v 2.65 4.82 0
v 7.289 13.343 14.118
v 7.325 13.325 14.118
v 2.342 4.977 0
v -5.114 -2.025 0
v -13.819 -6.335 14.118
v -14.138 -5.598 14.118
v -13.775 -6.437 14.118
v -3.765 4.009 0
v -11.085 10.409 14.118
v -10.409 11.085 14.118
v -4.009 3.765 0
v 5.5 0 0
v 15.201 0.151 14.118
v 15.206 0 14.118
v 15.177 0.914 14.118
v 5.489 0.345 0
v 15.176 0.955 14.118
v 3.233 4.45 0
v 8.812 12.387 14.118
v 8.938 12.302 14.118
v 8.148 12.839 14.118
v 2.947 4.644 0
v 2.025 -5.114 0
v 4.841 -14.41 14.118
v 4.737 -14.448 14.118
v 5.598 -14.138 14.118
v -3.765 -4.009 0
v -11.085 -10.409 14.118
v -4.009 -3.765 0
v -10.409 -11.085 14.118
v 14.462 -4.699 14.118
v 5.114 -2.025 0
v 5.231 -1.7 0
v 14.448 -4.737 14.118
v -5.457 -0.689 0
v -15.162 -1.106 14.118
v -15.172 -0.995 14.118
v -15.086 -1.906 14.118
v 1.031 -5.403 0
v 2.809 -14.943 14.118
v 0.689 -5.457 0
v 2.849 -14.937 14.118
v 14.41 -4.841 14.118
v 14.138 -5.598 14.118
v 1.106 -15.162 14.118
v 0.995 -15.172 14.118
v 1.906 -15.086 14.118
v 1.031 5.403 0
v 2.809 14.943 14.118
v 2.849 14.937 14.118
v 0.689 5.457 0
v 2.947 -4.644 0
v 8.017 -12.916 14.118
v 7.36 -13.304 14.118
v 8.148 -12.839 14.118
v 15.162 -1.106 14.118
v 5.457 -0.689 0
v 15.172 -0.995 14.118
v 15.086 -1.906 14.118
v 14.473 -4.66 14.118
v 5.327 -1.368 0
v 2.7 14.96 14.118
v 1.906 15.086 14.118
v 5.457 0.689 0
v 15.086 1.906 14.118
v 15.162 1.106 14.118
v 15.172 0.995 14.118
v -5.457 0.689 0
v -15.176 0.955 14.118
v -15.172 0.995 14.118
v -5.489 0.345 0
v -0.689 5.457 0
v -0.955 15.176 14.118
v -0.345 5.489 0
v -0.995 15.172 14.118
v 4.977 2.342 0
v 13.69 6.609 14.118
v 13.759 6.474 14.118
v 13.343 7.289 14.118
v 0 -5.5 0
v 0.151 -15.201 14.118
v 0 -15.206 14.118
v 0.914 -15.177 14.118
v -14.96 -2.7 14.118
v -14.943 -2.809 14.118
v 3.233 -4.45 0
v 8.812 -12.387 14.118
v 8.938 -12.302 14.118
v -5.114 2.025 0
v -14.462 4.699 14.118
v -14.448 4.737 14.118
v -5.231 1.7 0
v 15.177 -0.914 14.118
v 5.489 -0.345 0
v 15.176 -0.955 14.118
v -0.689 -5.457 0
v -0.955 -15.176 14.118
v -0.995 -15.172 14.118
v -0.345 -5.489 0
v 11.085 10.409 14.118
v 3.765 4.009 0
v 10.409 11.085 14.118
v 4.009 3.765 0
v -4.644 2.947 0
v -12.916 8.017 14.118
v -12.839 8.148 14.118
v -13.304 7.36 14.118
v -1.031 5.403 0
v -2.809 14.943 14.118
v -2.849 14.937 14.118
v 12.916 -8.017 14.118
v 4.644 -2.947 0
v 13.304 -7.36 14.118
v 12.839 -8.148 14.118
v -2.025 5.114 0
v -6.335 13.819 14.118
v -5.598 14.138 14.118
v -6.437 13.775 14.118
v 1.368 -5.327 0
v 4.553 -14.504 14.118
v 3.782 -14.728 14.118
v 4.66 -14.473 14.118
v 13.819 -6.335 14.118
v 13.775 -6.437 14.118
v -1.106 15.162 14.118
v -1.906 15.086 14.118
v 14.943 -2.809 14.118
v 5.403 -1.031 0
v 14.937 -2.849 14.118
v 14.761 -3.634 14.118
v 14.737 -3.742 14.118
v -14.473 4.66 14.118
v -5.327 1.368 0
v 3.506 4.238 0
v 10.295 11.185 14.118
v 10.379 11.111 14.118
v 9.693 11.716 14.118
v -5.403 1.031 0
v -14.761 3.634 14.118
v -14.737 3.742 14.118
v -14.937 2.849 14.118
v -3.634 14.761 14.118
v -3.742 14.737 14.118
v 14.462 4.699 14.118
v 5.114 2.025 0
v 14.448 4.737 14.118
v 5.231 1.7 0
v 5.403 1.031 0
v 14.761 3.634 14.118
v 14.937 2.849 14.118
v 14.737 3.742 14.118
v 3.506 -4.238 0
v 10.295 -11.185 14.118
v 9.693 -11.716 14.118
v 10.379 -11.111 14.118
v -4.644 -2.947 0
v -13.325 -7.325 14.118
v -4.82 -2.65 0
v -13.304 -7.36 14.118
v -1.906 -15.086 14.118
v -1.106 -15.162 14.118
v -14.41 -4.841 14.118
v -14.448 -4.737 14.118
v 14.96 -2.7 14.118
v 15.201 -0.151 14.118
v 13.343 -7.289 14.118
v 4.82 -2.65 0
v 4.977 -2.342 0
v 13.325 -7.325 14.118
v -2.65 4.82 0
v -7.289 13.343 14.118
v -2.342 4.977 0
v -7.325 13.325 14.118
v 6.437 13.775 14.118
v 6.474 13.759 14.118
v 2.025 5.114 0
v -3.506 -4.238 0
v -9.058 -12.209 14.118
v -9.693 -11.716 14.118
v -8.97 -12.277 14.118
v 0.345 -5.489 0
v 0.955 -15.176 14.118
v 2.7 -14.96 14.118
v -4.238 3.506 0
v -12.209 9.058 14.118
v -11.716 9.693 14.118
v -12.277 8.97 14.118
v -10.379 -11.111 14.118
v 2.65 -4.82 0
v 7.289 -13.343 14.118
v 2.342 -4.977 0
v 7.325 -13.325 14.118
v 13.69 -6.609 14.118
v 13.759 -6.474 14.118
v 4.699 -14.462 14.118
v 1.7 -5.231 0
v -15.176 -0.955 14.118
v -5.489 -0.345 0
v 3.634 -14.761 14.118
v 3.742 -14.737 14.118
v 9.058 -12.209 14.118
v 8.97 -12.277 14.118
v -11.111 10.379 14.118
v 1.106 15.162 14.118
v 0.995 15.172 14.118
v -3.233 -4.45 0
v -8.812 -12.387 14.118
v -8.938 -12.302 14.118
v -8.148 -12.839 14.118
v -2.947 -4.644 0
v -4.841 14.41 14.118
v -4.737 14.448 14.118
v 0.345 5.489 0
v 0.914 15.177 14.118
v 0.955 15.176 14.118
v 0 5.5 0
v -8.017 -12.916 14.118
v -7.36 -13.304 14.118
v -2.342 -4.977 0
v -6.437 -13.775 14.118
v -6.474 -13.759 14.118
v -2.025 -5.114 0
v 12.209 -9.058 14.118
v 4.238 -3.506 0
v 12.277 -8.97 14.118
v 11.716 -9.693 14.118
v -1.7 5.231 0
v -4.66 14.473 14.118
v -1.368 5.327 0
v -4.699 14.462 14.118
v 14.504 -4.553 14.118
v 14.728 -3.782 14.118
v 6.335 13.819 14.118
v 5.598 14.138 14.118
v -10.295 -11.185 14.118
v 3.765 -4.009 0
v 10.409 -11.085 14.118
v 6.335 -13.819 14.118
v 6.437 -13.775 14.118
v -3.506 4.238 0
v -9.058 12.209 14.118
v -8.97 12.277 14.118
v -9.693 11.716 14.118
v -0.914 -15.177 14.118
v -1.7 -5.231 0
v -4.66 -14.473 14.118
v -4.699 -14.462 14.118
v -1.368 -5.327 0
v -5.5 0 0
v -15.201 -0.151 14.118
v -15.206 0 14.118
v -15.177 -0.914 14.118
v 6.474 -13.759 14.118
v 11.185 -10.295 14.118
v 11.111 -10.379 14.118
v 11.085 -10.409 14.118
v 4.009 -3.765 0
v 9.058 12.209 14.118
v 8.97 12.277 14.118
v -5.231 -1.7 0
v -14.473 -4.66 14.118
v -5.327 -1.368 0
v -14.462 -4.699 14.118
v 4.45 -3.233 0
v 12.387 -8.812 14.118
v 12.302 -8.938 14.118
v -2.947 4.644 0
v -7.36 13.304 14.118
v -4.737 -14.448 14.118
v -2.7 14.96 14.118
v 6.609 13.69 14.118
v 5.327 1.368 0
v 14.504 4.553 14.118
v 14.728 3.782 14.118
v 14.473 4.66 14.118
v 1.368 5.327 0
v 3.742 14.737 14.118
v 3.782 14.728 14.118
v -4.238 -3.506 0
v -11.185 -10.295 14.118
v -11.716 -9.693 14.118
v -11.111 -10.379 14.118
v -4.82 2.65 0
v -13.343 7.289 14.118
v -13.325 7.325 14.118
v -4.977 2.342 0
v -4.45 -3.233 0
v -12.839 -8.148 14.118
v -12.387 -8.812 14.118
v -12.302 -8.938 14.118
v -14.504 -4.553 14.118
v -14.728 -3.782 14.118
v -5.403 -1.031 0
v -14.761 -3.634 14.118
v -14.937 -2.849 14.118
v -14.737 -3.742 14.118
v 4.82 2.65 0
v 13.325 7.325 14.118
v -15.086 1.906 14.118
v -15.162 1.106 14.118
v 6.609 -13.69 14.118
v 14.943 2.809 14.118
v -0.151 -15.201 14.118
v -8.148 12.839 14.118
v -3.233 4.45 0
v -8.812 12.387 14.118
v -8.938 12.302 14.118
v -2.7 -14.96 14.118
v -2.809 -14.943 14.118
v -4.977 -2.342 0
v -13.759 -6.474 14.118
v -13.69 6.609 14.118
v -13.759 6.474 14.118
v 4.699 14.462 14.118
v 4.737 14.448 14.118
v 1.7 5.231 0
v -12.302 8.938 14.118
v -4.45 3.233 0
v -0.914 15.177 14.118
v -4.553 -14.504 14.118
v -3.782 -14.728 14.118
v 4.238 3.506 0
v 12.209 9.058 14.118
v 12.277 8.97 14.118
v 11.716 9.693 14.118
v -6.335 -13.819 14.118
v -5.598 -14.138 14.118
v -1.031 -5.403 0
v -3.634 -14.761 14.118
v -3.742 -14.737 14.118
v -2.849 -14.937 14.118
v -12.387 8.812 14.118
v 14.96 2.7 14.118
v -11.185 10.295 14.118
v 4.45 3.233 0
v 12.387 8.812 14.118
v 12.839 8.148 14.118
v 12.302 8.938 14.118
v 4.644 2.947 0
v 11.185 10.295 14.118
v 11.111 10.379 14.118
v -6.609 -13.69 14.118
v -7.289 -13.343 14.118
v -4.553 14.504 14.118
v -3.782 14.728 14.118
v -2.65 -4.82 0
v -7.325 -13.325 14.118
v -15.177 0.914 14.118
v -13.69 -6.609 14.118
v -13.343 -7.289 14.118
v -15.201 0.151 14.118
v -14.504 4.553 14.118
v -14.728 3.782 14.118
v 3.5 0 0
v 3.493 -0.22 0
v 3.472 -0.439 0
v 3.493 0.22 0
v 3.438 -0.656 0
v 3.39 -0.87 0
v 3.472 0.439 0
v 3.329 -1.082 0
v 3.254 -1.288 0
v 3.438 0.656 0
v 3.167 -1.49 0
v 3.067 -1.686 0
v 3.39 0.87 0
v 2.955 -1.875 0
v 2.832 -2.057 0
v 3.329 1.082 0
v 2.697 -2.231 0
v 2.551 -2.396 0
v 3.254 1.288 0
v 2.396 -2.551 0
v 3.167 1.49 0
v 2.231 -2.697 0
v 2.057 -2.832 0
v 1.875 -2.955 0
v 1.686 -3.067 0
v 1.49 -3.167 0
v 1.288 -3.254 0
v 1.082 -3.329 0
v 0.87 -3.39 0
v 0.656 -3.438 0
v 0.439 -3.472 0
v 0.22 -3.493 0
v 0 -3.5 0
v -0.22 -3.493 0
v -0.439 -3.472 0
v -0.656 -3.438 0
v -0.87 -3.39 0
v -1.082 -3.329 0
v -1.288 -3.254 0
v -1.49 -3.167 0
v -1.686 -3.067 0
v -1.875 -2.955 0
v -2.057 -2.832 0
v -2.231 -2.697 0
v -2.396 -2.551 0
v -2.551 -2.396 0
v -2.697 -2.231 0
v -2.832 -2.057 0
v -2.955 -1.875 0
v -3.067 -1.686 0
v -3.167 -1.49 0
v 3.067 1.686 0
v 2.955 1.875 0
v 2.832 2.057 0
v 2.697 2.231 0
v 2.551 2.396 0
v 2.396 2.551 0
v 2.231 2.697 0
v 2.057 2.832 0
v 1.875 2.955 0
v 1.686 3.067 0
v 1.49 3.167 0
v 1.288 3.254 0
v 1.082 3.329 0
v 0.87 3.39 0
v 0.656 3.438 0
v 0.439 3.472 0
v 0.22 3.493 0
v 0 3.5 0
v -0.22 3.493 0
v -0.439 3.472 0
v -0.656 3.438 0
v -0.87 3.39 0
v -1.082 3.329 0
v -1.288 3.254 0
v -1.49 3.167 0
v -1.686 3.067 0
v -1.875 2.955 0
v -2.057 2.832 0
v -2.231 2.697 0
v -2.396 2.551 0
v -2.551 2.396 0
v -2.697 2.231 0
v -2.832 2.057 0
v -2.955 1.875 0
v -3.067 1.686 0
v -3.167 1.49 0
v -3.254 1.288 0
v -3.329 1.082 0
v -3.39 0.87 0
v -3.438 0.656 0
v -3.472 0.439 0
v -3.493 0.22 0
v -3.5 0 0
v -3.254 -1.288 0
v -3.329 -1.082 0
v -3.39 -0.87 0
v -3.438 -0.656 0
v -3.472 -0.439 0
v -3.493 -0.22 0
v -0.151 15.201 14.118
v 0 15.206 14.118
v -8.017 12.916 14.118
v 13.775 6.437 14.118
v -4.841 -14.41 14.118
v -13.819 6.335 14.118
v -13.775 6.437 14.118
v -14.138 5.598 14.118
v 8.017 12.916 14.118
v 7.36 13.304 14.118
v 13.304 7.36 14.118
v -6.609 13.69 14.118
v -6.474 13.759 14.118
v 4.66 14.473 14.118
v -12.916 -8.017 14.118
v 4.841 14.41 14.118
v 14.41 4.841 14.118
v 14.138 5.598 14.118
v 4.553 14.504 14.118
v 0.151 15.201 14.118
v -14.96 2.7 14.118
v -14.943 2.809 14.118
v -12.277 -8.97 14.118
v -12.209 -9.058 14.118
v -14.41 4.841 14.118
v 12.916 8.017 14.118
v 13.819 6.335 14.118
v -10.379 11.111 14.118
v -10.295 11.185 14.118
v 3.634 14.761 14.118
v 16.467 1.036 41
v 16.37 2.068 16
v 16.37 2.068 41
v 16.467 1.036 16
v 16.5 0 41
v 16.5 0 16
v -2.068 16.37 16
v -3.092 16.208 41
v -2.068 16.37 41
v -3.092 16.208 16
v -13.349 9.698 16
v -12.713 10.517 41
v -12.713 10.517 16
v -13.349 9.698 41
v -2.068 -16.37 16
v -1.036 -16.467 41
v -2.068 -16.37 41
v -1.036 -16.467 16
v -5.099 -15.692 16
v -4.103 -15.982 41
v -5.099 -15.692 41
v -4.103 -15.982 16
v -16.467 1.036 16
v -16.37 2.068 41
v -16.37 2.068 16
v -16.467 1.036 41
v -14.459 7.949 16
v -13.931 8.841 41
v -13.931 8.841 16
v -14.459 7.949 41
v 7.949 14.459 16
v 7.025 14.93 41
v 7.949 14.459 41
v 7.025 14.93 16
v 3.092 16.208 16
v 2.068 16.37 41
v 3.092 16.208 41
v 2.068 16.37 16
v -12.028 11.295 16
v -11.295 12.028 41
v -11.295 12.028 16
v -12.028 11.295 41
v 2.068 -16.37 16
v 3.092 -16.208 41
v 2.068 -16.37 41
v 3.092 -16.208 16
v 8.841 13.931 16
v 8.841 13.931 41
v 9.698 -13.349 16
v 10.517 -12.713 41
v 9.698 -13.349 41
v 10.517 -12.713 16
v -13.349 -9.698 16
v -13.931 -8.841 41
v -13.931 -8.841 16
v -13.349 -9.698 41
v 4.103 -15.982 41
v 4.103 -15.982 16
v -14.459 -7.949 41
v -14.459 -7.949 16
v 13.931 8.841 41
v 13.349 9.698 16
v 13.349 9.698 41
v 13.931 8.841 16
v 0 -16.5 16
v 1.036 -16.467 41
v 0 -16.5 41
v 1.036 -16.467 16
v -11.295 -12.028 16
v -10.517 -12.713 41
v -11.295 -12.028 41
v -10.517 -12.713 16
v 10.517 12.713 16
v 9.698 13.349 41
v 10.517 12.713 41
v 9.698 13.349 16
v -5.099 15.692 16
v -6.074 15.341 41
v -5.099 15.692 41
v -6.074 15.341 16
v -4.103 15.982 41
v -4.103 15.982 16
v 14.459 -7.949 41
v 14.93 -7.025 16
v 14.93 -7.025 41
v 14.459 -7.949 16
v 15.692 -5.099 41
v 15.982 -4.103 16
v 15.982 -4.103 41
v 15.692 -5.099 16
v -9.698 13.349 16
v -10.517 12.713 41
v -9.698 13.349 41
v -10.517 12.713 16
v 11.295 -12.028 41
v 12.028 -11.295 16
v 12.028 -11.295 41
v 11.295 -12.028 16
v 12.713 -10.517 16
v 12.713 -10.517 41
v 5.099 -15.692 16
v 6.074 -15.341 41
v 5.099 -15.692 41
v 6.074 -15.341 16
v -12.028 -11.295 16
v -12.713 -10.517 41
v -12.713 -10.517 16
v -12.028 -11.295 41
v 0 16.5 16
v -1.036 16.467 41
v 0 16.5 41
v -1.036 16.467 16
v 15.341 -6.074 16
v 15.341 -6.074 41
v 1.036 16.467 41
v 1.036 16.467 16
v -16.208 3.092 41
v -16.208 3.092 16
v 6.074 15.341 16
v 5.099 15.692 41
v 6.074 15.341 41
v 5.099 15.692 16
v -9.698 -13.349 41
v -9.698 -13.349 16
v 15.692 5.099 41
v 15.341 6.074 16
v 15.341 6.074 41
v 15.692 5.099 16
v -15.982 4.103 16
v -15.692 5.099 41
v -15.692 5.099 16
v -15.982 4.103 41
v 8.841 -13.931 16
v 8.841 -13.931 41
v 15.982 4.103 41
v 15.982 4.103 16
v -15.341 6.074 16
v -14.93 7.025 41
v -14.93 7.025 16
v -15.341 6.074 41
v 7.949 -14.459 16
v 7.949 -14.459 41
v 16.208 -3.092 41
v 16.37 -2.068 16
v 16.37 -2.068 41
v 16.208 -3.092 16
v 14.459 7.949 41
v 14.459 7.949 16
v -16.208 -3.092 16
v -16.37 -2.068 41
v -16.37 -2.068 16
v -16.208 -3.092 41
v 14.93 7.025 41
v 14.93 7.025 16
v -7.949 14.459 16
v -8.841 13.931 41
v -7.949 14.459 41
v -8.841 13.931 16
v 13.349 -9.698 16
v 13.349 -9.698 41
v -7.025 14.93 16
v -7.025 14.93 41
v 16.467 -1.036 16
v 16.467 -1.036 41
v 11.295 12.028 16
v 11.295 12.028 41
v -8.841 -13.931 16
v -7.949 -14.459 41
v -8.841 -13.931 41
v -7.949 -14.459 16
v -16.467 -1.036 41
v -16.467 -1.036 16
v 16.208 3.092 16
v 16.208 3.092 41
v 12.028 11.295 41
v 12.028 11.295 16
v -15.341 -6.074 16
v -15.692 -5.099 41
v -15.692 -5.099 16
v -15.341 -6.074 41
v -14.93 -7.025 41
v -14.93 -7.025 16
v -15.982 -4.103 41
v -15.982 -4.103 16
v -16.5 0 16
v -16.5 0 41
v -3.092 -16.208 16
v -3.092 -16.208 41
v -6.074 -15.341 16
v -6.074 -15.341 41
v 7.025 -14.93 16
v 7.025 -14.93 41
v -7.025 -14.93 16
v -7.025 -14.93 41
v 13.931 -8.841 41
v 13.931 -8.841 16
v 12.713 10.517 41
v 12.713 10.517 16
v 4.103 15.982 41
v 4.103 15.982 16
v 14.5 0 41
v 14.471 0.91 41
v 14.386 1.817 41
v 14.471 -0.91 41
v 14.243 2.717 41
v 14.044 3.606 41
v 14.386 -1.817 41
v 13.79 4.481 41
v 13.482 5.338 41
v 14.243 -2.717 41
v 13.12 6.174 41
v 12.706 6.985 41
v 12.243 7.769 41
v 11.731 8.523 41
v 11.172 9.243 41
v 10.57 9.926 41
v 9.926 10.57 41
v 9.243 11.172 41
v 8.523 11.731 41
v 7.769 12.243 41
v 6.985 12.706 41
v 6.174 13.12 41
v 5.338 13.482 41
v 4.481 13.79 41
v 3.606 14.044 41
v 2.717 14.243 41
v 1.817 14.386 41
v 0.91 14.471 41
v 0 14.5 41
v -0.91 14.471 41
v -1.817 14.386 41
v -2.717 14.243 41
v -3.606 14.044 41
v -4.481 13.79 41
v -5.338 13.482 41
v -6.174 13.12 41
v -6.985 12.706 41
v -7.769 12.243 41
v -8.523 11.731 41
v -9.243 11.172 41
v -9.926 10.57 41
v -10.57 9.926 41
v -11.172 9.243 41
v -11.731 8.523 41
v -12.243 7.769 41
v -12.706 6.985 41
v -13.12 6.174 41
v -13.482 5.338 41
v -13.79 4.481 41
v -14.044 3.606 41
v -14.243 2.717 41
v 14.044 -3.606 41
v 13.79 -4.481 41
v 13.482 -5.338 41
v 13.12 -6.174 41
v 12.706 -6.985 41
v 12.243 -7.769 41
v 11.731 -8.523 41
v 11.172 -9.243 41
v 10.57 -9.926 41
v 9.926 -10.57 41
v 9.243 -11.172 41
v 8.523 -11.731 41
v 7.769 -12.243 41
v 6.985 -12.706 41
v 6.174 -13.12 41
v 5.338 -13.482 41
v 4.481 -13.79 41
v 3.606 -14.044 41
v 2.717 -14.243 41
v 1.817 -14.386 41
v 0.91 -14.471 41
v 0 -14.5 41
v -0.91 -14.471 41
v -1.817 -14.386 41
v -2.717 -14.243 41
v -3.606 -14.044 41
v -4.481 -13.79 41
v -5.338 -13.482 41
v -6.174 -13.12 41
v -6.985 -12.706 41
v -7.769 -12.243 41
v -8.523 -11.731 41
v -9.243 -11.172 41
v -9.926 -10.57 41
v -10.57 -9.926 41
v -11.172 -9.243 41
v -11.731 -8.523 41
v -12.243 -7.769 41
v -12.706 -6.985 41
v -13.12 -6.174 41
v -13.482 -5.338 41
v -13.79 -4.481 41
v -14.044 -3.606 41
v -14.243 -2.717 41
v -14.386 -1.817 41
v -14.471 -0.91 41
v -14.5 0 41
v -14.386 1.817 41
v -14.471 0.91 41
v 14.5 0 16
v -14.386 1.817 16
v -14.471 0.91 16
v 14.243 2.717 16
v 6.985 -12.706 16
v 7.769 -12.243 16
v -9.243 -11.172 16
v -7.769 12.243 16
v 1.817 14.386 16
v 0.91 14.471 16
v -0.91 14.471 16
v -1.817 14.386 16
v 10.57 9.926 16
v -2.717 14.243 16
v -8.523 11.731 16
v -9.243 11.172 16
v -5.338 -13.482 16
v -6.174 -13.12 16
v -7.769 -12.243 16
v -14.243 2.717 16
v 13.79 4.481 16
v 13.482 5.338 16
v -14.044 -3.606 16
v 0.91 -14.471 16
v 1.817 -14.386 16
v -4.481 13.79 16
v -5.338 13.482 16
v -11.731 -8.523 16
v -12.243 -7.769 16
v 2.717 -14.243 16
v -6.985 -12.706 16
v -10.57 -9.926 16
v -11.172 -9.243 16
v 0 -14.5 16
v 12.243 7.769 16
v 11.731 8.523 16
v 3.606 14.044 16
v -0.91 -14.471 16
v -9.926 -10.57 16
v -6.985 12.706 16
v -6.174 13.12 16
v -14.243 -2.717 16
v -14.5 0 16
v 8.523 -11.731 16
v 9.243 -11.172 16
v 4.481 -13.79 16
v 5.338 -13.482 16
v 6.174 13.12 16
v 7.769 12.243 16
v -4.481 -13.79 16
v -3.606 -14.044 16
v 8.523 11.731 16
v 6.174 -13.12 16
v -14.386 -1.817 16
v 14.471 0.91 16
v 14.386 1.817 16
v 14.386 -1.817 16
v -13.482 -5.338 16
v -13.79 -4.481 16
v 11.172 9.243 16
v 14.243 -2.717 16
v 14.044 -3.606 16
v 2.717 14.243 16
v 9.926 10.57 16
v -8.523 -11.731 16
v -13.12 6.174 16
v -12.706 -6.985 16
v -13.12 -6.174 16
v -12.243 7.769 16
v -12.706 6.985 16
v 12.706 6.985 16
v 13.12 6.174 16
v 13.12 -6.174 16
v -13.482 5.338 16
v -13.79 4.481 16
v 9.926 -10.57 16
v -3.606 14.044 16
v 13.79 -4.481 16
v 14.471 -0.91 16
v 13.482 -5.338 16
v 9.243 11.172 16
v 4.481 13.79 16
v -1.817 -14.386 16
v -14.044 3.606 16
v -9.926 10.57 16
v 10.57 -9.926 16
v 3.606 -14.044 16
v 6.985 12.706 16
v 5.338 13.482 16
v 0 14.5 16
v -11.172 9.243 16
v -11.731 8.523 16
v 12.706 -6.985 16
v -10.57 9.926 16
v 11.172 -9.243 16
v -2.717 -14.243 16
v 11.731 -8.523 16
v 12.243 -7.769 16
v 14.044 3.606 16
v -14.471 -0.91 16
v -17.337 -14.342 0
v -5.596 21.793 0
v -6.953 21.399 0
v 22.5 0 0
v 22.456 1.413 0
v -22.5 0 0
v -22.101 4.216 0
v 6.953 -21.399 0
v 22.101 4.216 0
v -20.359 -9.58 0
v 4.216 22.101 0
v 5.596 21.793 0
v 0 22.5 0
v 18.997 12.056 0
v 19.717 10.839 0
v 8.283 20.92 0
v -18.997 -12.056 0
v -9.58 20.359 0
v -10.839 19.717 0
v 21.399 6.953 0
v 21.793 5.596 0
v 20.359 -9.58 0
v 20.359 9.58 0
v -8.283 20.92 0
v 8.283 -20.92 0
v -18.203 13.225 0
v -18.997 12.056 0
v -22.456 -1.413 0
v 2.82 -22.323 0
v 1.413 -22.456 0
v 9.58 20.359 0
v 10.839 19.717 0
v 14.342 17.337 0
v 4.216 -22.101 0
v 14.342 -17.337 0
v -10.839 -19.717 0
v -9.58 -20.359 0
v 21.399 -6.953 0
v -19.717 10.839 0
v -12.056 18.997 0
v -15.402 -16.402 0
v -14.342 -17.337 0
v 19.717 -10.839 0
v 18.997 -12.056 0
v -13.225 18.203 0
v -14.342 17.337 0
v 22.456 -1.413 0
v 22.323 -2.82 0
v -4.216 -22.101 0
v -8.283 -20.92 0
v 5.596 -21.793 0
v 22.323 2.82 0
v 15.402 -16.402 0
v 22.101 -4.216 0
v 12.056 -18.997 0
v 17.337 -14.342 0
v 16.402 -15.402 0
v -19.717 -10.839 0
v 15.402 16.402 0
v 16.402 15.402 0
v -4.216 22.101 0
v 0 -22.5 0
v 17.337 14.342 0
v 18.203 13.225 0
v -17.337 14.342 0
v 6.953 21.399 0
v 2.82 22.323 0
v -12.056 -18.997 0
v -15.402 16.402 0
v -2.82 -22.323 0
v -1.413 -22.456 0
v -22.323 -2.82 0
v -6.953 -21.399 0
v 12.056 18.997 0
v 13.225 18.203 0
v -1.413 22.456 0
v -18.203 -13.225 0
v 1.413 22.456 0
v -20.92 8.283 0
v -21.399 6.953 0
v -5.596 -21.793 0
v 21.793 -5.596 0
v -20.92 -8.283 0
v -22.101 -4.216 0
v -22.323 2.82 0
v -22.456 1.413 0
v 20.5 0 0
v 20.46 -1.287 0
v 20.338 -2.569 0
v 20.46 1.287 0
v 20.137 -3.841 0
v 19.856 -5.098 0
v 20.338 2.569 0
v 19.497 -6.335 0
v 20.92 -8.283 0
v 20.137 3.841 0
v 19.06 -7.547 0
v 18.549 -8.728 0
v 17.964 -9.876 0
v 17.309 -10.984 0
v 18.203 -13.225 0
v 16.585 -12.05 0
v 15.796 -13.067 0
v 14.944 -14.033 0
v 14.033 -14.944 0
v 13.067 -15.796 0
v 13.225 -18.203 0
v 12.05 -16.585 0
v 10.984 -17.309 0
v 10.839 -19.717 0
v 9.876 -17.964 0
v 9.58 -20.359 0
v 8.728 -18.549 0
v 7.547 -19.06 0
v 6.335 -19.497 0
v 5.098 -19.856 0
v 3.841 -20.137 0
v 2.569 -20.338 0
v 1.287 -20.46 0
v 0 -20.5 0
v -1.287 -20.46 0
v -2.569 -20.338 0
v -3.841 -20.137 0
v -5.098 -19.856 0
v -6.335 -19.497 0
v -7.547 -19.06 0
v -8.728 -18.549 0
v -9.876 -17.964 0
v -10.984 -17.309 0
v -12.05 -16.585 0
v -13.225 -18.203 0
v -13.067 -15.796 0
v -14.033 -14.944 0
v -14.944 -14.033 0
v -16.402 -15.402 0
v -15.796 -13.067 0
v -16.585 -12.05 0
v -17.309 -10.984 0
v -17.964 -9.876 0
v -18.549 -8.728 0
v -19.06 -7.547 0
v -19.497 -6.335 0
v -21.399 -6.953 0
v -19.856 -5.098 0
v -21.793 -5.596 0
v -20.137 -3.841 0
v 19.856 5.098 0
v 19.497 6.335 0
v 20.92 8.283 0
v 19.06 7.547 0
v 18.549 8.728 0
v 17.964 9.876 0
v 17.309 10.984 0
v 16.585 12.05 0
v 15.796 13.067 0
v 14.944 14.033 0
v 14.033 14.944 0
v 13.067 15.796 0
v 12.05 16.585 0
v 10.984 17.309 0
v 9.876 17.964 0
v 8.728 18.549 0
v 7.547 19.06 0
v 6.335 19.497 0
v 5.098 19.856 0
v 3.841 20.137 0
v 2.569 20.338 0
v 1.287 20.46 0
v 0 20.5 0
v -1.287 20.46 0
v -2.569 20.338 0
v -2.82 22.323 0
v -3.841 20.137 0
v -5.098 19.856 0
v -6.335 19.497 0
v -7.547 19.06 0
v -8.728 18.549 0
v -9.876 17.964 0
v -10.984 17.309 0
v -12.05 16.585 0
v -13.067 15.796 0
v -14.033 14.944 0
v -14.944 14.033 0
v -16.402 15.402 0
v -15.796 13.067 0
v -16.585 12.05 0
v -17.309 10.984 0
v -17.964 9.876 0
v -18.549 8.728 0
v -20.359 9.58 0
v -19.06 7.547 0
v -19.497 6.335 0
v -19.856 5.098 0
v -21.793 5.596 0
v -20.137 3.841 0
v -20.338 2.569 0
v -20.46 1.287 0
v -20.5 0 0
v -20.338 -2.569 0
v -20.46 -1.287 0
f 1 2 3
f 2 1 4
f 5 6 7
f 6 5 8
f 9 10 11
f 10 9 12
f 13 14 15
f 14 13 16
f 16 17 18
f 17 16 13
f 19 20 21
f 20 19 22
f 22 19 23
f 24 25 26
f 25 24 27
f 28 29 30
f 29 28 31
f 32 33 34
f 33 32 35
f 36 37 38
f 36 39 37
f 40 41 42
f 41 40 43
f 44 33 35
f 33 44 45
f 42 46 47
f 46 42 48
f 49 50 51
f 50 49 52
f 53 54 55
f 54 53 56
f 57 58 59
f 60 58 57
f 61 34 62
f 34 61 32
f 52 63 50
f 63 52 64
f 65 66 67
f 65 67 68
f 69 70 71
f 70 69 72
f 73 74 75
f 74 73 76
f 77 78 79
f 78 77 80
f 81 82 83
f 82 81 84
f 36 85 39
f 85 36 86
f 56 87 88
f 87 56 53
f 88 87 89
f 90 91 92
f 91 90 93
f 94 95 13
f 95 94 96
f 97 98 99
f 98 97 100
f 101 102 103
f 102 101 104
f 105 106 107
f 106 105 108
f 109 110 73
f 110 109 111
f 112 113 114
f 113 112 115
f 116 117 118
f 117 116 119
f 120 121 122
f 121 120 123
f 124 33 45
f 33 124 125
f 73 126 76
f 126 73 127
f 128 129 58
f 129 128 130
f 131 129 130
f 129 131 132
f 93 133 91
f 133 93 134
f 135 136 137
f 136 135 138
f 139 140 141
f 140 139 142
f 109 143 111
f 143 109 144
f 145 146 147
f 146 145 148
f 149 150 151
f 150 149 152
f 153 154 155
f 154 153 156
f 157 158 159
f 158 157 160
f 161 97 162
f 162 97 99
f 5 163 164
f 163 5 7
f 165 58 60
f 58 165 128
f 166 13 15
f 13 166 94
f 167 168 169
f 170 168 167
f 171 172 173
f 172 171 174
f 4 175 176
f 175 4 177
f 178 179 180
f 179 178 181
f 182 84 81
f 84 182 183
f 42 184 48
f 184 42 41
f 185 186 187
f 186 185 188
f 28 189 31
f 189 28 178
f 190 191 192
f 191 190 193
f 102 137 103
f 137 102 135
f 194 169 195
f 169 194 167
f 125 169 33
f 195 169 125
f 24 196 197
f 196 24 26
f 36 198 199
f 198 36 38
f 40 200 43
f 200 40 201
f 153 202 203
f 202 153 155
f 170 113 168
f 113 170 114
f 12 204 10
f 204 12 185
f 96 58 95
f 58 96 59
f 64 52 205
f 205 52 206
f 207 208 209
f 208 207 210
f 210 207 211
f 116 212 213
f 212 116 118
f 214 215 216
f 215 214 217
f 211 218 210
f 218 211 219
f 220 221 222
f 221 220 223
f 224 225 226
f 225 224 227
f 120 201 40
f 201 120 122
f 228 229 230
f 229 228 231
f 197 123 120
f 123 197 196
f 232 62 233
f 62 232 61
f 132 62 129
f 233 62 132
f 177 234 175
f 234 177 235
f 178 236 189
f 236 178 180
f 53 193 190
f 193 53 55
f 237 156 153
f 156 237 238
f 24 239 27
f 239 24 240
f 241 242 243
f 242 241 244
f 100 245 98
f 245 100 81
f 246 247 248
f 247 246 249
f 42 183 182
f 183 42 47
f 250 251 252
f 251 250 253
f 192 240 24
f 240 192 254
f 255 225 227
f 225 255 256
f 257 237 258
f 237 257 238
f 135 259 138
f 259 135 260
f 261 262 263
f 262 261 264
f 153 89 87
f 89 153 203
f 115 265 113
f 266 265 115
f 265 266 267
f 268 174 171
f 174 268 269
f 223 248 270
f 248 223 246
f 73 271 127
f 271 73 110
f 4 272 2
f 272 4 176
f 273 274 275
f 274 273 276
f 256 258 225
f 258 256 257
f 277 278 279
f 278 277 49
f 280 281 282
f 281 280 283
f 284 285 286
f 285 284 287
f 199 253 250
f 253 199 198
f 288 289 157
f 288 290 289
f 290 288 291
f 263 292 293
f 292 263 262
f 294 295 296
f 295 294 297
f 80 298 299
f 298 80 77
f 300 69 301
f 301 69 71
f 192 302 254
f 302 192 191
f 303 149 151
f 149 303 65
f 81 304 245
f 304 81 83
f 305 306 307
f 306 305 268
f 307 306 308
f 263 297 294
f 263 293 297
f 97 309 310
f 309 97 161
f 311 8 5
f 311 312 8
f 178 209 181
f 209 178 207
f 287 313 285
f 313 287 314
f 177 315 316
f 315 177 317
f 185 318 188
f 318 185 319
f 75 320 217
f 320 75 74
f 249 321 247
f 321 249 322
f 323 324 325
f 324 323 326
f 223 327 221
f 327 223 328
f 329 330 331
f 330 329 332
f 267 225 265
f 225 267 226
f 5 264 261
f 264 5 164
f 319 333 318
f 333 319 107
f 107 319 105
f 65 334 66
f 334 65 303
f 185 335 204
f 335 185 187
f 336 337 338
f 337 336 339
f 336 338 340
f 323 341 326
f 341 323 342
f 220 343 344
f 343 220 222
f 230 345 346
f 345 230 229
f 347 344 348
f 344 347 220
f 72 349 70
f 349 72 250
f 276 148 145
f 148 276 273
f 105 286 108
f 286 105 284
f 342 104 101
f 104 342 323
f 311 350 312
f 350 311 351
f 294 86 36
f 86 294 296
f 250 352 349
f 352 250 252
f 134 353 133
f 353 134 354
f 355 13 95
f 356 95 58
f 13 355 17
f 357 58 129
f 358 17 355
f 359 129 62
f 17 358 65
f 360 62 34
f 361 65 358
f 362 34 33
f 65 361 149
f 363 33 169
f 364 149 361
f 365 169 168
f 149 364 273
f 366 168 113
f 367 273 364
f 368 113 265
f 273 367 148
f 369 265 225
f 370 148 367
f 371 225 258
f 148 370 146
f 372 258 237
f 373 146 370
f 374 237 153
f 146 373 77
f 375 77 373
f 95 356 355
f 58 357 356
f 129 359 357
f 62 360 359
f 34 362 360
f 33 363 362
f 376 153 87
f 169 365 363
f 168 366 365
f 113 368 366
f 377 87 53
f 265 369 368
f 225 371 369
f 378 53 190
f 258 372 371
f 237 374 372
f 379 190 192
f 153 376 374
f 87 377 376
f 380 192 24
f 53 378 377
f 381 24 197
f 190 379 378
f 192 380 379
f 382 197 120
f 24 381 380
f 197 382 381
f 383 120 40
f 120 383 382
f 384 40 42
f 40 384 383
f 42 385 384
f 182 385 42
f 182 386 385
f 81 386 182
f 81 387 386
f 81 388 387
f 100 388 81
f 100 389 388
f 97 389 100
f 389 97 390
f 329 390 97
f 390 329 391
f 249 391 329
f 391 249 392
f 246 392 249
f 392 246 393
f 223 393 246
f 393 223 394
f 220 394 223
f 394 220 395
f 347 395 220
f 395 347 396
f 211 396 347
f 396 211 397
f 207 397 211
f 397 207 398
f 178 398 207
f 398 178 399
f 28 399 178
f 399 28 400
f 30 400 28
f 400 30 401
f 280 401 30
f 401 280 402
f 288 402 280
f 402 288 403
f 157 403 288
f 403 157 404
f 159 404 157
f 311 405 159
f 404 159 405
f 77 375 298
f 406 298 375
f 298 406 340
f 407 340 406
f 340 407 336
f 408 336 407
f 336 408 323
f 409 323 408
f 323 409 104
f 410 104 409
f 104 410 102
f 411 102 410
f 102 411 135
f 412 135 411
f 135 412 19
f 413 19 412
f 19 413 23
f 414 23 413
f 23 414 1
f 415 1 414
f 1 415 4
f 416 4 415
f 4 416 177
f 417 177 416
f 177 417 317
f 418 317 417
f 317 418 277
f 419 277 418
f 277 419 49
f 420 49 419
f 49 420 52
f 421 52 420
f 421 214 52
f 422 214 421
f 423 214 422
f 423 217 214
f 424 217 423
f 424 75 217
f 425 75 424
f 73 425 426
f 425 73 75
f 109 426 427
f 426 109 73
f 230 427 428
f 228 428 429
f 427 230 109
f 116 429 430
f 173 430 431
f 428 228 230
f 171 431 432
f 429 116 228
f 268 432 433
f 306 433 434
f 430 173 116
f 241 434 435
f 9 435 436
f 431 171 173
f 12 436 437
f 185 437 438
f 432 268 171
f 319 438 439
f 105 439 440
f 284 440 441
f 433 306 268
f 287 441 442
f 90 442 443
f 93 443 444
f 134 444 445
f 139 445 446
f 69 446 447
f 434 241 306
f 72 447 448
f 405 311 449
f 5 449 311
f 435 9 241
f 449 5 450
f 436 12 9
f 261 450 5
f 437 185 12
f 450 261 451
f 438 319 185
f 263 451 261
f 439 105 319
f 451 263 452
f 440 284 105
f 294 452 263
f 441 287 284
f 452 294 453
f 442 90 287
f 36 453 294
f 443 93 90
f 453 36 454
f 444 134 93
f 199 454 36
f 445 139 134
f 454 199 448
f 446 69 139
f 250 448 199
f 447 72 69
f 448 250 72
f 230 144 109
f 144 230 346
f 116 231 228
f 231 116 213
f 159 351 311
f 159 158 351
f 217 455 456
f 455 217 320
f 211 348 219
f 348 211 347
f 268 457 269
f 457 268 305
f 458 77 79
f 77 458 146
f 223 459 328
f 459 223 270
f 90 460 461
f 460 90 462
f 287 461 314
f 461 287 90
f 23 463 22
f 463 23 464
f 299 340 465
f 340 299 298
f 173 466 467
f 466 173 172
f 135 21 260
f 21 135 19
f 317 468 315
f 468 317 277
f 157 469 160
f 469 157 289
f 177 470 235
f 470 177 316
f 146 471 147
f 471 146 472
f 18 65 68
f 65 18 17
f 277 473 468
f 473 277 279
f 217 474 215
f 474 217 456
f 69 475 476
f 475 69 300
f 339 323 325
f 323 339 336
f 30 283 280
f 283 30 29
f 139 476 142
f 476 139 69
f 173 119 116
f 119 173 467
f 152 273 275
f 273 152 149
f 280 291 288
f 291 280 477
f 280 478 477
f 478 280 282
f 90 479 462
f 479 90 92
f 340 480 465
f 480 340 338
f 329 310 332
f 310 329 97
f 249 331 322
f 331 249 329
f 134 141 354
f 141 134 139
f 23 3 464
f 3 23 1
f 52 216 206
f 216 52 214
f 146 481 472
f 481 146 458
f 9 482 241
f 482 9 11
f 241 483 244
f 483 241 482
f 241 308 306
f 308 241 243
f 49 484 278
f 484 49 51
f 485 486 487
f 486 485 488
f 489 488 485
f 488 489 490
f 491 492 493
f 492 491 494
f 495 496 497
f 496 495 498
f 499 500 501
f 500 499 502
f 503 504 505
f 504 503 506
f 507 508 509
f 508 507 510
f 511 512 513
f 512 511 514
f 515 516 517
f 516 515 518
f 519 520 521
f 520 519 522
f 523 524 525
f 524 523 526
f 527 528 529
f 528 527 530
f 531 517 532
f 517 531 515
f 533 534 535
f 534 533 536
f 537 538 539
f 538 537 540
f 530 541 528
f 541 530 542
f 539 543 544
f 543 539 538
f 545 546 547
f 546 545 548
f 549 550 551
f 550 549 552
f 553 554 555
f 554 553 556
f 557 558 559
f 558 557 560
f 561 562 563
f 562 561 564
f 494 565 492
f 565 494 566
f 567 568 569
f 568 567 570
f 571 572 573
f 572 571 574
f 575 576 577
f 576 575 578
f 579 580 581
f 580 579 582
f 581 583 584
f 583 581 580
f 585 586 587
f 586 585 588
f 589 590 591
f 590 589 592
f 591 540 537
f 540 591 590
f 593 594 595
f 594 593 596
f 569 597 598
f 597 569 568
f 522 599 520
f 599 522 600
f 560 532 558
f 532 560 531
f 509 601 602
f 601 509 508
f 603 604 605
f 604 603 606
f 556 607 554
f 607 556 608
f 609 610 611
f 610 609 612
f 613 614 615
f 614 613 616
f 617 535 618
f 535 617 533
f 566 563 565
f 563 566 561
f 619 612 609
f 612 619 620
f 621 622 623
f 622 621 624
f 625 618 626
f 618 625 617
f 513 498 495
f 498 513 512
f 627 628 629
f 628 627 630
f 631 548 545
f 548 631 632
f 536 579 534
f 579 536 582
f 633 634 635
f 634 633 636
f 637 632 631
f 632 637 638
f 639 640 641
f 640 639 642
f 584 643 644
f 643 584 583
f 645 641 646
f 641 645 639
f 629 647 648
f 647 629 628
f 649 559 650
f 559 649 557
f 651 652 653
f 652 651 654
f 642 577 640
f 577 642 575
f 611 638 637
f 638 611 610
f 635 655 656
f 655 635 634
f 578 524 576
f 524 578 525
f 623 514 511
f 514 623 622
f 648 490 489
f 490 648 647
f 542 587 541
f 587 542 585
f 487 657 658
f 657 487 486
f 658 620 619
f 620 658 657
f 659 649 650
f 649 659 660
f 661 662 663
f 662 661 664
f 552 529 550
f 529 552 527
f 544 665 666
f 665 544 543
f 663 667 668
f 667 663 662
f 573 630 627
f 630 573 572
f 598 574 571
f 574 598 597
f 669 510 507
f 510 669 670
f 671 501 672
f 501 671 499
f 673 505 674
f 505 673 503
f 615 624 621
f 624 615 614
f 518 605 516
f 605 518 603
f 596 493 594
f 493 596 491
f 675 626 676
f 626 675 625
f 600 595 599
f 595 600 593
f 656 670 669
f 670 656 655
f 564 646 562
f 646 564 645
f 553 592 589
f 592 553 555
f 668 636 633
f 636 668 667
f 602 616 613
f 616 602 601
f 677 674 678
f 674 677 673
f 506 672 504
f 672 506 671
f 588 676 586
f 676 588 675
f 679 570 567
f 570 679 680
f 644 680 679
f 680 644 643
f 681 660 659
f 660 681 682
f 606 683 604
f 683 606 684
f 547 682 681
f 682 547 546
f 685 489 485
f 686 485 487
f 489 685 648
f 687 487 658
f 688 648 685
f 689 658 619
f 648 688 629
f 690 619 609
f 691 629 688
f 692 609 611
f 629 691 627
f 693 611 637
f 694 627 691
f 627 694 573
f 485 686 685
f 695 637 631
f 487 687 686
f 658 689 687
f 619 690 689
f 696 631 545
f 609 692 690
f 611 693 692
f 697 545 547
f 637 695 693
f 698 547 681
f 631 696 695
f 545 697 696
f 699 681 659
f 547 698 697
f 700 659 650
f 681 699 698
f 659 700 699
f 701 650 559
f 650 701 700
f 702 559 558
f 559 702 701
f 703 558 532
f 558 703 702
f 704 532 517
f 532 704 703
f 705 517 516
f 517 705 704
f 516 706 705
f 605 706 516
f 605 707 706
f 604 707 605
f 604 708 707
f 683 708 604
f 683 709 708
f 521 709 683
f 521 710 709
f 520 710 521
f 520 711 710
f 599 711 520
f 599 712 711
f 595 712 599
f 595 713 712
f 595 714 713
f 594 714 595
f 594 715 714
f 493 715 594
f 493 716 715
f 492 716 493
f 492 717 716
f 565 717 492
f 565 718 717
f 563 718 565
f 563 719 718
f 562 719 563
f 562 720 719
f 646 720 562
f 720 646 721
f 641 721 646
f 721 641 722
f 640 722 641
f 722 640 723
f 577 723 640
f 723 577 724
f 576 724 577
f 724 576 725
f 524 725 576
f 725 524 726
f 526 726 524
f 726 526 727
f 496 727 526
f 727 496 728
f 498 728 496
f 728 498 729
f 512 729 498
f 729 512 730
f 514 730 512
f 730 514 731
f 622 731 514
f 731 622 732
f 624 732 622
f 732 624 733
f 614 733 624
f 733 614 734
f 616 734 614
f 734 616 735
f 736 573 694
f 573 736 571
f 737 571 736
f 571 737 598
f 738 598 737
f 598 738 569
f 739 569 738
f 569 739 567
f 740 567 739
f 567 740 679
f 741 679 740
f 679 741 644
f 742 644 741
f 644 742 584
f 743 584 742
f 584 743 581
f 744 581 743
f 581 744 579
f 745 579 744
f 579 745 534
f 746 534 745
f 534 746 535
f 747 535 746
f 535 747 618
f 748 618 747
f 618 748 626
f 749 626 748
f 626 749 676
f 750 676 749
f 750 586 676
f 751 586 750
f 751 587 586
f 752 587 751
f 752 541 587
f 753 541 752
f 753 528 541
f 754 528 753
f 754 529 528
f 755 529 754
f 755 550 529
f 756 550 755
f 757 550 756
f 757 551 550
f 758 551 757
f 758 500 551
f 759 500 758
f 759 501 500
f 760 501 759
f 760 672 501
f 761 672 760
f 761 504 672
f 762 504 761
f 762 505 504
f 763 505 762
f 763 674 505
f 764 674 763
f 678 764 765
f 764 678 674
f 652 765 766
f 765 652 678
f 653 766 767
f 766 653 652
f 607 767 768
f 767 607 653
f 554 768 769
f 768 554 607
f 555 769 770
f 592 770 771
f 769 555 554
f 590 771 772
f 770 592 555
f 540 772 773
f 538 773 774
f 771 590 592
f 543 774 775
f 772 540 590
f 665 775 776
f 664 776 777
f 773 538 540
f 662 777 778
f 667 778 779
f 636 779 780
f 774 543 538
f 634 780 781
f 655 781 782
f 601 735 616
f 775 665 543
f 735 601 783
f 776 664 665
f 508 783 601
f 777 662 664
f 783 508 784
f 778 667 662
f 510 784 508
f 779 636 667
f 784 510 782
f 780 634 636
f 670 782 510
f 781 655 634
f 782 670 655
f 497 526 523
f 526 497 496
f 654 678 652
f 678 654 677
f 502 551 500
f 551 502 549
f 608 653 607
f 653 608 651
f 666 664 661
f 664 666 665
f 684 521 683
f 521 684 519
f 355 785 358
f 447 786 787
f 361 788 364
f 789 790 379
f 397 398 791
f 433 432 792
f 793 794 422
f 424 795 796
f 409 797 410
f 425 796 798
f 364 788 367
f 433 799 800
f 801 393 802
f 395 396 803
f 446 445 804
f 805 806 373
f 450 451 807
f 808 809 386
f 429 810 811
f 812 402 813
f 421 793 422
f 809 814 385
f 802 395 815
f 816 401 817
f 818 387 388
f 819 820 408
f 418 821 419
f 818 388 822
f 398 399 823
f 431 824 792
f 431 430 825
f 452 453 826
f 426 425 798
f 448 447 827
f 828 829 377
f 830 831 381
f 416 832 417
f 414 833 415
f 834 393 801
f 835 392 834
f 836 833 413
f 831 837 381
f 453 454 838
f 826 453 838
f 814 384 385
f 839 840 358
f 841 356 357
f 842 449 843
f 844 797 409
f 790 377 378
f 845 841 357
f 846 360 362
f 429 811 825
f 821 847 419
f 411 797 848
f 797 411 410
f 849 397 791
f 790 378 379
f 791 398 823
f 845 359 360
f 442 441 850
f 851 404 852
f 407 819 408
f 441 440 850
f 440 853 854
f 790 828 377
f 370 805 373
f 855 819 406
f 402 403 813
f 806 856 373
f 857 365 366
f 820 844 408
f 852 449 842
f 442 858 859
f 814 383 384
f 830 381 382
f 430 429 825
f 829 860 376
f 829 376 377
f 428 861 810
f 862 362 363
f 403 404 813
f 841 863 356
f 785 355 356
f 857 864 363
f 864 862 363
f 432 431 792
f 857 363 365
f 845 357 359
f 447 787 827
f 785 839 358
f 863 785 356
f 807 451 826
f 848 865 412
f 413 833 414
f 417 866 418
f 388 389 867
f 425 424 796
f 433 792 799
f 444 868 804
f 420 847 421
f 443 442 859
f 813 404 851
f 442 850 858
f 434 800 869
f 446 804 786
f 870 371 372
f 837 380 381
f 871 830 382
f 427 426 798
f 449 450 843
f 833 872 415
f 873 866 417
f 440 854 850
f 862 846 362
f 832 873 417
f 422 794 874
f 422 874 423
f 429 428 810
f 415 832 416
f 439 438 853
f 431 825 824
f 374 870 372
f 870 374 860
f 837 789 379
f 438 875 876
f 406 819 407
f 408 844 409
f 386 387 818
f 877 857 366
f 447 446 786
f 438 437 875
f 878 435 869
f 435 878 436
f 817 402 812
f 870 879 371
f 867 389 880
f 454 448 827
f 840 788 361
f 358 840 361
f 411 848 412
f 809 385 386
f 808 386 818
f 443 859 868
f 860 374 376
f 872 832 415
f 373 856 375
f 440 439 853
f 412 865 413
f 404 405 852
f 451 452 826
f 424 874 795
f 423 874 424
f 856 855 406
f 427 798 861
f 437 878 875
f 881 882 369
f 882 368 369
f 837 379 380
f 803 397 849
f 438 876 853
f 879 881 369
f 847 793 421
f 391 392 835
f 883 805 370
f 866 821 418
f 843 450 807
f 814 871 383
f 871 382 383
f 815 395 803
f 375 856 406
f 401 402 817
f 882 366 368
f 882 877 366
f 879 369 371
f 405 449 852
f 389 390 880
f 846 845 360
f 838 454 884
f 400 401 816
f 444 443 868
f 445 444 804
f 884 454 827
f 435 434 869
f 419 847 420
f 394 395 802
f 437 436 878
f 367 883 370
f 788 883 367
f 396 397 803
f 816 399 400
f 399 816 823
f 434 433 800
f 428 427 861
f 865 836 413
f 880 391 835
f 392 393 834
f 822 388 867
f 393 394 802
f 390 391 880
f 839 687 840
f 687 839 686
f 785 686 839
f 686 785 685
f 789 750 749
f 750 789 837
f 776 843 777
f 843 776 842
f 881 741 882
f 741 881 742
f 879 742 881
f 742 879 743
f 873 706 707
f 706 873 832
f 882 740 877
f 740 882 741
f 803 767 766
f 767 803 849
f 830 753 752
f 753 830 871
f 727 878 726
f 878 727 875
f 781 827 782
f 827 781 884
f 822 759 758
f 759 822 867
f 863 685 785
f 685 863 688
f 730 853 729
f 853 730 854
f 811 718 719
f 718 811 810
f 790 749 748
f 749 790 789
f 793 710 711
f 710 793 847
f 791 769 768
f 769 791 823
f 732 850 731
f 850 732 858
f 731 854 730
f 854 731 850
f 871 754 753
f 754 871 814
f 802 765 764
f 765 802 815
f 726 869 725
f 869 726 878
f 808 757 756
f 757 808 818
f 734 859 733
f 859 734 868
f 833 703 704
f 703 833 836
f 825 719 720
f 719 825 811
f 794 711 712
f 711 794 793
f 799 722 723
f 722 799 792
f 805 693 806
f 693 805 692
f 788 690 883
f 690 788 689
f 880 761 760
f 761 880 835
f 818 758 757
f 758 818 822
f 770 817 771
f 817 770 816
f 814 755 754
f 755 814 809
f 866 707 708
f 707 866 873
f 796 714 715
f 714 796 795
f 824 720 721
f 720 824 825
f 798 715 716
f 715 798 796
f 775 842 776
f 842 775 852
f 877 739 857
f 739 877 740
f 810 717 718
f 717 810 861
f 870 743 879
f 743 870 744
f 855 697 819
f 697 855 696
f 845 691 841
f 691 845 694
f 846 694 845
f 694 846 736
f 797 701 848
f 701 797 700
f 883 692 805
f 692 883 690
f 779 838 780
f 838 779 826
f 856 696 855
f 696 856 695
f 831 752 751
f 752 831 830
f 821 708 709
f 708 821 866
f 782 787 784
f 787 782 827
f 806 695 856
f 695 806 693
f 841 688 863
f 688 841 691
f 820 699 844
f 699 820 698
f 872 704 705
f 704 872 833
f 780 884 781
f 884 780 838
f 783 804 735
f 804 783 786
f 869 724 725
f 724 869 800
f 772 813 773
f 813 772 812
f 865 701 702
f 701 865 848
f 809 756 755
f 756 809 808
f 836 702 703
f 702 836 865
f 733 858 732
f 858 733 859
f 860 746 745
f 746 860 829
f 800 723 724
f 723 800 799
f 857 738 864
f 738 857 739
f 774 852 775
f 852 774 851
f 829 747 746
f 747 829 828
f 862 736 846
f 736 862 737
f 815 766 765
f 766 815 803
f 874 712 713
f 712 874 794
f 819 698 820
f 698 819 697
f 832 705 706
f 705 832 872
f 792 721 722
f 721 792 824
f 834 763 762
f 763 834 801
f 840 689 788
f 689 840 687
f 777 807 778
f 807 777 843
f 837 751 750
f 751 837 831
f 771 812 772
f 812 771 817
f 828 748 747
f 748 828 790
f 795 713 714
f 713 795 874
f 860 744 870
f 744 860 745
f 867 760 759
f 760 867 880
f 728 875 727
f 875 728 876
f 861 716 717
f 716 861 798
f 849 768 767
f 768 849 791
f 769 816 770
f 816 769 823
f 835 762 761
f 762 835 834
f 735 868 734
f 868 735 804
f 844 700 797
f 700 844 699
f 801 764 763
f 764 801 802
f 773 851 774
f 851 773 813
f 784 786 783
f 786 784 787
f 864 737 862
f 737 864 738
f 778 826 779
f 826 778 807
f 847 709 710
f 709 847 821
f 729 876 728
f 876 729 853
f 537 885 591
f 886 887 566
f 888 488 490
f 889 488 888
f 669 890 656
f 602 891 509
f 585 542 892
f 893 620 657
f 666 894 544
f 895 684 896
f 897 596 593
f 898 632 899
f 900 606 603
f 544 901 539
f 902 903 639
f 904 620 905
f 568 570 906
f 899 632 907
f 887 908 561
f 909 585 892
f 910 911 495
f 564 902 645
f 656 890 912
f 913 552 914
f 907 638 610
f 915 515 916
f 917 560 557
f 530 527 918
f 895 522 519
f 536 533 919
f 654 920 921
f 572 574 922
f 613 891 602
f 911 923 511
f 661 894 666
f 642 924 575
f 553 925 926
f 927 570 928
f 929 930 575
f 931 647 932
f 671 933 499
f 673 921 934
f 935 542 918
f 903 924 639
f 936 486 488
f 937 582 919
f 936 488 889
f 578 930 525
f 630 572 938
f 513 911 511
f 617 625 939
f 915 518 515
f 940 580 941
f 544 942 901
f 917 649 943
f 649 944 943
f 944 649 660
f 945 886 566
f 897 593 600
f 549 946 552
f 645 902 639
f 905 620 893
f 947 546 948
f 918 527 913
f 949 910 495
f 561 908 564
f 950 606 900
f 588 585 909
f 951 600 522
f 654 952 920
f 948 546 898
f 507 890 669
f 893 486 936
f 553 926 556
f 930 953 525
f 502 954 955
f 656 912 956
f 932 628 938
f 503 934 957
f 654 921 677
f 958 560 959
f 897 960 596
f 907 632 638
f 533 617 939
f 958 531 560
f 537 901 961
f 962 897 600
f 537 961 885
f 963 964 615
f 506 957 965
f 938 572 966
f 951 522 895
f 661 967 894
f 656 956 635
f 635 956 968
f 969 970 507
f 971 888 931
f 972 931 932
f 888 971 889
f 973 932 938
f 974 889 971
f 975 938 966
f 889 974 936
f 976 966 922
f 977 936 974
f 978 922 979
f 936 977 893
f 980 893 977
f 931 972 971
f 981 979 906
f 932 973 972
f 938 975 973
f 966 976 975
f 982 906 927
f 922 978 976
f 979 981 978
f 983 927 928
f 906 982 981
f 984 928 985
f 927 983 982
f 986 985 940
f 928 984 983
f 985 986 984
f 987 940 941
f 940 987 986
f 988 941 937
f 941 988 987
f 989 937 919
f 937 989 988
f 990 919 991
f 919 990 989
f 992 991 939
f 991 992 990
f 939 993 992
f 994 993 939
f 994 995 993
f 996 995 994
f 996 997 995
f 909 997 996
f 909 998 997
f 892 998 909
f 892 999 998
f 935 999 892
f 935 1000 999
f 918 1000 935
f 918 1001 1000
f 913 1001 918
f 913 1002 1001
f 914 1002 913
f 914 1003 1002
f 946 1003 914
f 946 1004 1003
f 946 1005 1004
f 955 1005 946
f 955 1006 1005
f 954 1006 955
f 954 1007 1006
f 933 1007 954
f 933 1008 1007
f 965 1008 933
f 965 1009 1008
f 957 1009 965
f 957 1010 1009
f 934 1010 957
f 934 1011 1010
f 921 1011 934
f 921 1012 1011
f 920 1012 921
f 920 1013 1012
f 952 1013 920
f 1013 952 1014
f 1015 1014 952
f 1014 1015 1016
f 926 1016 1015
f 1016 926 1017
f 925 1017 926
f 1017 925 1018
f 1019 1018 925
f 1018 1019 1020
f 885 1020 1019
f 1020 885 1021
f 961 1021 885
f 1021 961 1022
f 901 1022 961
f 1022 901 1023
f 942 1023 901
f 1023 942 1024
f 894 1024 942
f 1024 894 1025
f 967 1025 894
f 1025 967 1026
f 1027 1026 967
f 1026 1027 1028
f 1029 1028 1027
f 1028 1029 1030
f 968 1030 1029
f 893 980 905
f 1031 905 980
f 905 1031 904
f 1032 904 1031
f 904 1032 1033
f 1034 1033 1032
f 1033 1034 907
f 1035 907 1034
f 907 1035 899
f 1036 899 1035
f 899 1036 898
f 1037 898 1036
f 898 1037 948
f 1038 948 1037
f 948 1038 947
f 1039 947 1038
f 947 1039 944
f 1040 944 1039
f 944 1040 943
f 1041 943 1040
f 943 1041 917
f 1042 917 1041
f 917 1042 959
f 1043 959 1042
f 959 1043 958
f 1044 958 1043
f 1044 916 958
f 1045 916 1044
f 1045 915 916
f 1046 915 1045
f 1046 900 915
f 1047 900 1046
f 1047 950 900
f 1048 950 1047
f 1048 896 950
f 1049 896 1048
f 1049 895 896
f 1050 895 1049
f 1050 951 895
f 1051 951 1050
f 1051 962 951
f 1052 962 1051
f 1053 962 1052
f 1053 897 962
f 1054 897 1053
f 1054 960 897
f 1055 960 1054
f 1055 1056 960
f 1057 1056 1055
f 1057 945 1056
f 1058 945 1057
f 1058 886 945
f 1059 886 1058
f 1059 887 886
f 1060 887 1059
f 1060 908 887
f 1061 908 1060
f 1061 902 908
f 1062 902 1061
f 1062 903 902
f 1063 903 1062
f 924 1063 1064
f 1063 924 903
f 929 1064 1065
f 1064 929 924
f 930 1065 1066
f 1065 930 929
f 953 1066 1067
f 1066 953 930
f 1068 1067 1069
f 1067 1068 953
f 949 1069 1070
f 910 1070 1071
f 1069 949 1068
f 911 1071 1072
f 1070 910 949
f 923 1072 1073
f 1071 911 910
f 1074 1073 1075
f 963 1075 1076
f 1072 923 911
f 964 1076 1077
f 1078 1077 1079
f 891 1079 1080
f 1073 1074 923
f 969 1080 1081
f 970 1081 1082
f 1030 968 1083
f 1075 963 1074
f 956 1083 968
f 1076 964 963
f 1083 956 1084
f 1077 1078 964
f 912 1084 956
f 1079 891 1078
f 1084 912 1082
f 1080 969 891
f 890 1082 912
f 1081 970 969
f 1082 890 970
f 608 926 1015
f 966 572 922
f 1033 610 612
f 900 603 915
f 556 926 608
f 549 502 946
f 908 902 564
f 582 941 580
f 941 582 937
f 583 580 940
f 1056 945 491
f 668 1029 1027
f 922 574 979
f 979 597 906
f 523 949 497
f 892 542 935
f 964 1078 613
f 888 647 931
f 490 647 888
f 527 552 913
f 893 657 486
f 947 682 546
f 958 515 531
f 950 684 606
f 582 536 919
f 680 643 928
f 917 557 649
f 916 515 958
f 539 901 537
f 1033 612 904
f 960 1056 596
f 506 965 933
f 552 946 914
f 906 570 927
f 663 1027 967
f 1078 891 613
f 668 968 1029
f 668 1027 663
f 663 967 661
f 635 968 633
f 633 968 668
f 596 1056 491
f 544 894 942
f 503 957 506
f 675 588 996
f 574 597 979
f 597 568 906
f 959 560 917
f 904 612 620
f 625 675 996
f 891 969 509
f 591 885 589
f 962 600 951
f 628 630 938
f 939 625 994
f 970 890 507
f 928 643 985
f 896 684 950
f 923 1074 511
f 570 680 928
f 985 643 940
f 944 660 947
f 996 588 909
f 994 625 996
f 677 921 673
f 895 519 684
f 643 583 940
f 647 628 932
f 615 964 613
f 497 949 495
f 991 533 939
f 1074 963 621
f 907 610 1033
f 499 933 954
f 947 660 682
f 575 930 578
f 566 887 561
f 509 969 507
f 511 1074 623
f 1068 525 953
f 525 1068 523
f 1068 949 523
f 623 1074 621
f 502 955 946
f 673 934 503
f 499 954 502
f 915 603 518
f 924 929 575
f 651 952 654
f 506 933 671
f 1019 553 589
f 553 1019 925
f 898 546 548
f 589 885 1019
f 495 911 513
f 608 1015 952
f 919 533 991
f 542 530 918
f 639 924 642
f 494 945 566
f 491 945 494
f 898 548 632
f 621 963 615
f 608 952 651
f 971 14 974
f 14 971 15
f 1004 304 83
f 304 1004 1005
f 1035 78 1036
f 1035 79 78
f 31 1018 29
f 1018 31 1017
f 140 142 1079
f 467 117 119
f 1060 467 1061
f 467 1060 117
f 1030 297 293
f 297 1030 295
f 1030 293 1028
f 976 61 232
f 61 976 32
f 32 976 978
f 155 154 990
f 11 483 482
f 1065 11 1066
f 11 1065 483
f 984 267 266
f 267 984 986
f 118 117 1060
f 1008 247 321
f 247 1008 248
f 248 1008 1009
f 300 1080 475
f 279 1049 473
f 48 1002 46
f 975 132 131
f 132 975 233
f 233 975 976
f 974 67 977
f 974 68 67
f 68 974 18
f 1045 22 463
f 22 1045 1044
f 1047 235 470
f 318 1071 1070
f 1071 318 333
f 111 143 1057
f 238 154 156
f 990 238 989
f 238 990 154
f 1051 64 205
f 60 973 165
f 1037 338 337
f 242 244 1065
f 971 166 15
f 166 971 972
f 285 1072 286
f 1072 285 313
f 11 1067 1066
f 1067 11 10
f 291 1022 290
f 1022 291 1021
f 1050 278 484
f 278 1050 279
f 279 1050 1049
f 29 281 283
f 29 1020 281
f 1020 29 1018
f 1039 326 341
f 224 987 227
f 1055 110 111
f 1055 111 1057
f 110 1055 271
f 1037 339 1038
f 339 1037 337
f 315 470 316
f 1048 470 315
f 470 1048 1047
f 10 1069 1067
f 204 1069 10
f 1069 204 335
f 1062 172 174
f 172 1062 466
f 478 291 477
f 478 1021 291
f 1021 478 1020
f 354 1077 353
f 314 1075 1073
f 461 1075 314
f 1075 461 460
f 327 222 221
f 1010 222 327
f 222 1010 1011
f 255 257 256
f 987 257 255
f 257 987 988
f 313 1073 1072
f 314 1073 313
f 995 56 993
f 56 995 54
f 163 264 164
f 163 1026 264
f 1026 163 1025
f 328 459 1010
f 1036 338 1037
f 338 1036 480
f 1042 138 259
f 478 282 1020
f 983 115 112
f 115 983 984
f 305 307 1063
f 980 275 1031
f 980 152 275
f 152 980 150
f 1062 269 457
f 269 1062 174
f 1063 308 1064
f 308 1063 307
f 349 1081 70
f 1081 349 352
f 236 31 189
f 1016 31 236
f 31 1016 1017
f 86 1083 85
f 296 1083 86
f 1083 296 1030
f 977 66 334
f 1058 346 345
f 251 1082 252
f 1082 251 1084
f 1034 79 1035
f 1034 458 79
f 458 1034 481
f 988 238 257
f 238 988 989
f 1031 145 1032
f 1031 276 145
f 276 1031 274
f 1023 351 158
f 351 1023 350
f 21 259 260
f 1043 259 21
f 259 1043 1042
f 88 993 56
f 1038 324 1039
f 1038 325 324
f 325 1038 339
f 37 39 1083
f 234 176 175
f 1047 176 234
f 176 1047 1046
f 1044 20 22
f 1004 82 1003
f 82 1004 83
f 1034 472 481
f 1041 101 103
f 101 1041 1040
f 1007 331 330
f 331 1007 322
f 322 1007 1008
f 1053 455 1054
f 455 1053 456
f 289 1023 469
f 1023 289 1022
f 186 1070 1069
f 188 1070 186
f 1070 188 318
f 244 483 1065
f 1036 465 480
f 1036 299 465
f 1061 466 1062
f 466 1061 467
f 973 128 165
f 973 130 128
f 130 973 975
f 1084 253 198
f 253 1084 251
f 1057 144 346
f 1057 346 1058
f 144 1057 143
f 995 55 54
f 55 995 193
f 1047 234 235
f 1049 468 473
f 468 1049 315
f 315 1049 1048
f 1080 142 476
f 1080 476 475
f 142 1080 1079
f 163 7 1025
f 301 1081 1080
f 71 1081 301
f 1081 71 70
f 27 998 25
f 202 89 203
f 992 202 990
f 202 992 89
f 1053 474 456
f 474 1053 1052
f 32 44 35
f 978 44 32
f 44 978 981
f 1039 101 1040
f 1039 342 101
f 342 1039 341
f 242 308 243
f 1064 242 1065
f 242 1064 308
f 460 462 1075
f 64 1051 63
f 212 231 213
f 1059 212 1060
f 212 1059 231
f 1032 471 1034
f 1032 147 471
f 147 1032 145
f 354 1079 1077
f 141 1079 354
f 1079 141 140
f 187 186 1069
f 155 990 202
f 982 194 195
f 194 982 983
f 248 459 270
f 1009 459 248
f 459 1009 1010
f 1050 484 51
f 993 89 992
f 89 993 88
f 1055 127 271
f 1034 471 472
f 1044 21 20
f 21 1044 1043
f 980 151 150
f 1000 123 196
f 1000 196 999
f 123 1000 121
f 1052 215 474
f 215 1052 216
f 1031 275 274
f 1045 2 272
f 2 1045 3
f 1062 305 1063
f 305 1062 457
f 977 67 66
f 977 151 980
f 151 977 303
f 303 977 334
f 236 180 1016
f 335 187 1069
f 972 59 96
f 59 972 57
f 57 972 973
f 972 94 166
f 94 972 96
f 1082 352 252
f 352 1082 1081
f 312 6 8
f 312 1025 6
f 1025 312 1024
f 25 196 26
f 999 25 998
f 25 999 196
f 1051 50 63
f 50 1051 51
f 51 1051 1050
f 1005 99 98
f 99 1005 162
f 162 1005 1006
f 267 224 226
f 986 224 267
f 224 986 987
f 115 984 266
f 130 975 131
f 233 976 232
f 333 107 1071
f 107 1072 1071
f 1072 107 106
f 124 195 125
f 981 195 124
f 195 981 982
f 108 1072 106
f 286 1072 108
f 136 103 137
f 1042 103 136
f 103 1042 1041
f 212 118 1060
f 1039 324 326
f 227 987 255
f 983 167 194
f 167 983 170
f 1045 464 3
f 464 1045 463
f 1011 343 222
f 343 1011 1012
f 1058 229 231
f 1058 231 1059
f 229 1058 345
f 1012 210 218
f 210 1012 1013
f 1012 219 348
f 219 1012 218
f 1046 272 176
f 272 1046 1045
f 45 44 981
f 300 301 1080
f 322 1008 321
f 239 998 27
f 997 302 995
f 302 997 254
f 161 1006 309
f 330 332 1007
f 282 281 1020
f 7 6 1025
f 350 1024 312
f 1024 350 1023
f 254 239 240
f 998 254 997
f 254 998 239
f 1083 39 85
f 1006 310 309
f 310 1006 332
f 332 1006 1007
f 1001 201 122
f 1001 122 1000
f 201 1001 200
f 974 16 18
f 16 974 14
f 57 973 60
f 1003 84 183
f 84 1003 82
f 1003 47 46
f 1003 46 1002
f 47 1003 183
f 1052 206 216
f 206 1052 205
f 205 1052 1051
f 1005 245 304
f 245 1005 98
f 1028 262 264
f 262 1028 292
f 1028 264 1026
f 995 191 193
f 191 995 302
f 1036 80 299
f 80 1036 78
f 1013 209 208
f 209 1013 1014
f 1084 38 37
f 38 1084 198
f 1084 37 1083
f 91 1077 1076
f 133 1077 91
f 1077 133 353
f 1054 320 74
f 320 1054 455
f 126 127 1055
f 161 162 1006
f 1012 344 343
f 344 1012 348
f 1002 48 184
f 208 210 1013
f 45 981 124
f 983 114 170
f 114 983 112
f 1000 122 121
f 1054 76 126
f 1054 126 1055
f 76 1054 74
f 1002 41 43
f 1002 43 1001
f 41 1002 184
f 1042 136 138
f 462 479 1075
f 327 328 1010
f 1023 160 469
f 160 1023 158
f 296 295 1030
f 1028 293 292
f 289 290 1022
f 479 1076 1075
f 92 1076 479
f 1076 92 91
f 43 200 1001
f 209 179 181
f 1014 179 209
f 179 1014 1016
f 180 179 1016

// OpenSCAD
//The part wall thickness
wall = 2;
//outer diameter of conical
tube_diameter = 29;
//diameter of bottom tip of conical
bottom_diameter = 7; 
//height of the tapered part of conical
taper_height = 16; 
//total height of holder
overall_height = 25; 
//desired diameter of base.  
base_diameter = 45;  


/*[Hidden]*/
$fn = 100;

difference() {
conical(bottom_diameter+2*wall,taper_height,tube_diameter+2*wall,overall_height);
conical(bottom_diameter,taper_height,tube_diameter,overall_height);
}
difference() {
conical(base_diameter,taper_height,tube_diameter+2*wall,overall_height);
conical(base_diameter-2*wall,taper_height,tube_diameter,overall_height);
}
module conical(bd,th,td,oah) {
  cylinder(h=th,d1=bd,d2=td,center=false);
  translate([0,0,th]) cylinder(h=oah,d=td);
}
